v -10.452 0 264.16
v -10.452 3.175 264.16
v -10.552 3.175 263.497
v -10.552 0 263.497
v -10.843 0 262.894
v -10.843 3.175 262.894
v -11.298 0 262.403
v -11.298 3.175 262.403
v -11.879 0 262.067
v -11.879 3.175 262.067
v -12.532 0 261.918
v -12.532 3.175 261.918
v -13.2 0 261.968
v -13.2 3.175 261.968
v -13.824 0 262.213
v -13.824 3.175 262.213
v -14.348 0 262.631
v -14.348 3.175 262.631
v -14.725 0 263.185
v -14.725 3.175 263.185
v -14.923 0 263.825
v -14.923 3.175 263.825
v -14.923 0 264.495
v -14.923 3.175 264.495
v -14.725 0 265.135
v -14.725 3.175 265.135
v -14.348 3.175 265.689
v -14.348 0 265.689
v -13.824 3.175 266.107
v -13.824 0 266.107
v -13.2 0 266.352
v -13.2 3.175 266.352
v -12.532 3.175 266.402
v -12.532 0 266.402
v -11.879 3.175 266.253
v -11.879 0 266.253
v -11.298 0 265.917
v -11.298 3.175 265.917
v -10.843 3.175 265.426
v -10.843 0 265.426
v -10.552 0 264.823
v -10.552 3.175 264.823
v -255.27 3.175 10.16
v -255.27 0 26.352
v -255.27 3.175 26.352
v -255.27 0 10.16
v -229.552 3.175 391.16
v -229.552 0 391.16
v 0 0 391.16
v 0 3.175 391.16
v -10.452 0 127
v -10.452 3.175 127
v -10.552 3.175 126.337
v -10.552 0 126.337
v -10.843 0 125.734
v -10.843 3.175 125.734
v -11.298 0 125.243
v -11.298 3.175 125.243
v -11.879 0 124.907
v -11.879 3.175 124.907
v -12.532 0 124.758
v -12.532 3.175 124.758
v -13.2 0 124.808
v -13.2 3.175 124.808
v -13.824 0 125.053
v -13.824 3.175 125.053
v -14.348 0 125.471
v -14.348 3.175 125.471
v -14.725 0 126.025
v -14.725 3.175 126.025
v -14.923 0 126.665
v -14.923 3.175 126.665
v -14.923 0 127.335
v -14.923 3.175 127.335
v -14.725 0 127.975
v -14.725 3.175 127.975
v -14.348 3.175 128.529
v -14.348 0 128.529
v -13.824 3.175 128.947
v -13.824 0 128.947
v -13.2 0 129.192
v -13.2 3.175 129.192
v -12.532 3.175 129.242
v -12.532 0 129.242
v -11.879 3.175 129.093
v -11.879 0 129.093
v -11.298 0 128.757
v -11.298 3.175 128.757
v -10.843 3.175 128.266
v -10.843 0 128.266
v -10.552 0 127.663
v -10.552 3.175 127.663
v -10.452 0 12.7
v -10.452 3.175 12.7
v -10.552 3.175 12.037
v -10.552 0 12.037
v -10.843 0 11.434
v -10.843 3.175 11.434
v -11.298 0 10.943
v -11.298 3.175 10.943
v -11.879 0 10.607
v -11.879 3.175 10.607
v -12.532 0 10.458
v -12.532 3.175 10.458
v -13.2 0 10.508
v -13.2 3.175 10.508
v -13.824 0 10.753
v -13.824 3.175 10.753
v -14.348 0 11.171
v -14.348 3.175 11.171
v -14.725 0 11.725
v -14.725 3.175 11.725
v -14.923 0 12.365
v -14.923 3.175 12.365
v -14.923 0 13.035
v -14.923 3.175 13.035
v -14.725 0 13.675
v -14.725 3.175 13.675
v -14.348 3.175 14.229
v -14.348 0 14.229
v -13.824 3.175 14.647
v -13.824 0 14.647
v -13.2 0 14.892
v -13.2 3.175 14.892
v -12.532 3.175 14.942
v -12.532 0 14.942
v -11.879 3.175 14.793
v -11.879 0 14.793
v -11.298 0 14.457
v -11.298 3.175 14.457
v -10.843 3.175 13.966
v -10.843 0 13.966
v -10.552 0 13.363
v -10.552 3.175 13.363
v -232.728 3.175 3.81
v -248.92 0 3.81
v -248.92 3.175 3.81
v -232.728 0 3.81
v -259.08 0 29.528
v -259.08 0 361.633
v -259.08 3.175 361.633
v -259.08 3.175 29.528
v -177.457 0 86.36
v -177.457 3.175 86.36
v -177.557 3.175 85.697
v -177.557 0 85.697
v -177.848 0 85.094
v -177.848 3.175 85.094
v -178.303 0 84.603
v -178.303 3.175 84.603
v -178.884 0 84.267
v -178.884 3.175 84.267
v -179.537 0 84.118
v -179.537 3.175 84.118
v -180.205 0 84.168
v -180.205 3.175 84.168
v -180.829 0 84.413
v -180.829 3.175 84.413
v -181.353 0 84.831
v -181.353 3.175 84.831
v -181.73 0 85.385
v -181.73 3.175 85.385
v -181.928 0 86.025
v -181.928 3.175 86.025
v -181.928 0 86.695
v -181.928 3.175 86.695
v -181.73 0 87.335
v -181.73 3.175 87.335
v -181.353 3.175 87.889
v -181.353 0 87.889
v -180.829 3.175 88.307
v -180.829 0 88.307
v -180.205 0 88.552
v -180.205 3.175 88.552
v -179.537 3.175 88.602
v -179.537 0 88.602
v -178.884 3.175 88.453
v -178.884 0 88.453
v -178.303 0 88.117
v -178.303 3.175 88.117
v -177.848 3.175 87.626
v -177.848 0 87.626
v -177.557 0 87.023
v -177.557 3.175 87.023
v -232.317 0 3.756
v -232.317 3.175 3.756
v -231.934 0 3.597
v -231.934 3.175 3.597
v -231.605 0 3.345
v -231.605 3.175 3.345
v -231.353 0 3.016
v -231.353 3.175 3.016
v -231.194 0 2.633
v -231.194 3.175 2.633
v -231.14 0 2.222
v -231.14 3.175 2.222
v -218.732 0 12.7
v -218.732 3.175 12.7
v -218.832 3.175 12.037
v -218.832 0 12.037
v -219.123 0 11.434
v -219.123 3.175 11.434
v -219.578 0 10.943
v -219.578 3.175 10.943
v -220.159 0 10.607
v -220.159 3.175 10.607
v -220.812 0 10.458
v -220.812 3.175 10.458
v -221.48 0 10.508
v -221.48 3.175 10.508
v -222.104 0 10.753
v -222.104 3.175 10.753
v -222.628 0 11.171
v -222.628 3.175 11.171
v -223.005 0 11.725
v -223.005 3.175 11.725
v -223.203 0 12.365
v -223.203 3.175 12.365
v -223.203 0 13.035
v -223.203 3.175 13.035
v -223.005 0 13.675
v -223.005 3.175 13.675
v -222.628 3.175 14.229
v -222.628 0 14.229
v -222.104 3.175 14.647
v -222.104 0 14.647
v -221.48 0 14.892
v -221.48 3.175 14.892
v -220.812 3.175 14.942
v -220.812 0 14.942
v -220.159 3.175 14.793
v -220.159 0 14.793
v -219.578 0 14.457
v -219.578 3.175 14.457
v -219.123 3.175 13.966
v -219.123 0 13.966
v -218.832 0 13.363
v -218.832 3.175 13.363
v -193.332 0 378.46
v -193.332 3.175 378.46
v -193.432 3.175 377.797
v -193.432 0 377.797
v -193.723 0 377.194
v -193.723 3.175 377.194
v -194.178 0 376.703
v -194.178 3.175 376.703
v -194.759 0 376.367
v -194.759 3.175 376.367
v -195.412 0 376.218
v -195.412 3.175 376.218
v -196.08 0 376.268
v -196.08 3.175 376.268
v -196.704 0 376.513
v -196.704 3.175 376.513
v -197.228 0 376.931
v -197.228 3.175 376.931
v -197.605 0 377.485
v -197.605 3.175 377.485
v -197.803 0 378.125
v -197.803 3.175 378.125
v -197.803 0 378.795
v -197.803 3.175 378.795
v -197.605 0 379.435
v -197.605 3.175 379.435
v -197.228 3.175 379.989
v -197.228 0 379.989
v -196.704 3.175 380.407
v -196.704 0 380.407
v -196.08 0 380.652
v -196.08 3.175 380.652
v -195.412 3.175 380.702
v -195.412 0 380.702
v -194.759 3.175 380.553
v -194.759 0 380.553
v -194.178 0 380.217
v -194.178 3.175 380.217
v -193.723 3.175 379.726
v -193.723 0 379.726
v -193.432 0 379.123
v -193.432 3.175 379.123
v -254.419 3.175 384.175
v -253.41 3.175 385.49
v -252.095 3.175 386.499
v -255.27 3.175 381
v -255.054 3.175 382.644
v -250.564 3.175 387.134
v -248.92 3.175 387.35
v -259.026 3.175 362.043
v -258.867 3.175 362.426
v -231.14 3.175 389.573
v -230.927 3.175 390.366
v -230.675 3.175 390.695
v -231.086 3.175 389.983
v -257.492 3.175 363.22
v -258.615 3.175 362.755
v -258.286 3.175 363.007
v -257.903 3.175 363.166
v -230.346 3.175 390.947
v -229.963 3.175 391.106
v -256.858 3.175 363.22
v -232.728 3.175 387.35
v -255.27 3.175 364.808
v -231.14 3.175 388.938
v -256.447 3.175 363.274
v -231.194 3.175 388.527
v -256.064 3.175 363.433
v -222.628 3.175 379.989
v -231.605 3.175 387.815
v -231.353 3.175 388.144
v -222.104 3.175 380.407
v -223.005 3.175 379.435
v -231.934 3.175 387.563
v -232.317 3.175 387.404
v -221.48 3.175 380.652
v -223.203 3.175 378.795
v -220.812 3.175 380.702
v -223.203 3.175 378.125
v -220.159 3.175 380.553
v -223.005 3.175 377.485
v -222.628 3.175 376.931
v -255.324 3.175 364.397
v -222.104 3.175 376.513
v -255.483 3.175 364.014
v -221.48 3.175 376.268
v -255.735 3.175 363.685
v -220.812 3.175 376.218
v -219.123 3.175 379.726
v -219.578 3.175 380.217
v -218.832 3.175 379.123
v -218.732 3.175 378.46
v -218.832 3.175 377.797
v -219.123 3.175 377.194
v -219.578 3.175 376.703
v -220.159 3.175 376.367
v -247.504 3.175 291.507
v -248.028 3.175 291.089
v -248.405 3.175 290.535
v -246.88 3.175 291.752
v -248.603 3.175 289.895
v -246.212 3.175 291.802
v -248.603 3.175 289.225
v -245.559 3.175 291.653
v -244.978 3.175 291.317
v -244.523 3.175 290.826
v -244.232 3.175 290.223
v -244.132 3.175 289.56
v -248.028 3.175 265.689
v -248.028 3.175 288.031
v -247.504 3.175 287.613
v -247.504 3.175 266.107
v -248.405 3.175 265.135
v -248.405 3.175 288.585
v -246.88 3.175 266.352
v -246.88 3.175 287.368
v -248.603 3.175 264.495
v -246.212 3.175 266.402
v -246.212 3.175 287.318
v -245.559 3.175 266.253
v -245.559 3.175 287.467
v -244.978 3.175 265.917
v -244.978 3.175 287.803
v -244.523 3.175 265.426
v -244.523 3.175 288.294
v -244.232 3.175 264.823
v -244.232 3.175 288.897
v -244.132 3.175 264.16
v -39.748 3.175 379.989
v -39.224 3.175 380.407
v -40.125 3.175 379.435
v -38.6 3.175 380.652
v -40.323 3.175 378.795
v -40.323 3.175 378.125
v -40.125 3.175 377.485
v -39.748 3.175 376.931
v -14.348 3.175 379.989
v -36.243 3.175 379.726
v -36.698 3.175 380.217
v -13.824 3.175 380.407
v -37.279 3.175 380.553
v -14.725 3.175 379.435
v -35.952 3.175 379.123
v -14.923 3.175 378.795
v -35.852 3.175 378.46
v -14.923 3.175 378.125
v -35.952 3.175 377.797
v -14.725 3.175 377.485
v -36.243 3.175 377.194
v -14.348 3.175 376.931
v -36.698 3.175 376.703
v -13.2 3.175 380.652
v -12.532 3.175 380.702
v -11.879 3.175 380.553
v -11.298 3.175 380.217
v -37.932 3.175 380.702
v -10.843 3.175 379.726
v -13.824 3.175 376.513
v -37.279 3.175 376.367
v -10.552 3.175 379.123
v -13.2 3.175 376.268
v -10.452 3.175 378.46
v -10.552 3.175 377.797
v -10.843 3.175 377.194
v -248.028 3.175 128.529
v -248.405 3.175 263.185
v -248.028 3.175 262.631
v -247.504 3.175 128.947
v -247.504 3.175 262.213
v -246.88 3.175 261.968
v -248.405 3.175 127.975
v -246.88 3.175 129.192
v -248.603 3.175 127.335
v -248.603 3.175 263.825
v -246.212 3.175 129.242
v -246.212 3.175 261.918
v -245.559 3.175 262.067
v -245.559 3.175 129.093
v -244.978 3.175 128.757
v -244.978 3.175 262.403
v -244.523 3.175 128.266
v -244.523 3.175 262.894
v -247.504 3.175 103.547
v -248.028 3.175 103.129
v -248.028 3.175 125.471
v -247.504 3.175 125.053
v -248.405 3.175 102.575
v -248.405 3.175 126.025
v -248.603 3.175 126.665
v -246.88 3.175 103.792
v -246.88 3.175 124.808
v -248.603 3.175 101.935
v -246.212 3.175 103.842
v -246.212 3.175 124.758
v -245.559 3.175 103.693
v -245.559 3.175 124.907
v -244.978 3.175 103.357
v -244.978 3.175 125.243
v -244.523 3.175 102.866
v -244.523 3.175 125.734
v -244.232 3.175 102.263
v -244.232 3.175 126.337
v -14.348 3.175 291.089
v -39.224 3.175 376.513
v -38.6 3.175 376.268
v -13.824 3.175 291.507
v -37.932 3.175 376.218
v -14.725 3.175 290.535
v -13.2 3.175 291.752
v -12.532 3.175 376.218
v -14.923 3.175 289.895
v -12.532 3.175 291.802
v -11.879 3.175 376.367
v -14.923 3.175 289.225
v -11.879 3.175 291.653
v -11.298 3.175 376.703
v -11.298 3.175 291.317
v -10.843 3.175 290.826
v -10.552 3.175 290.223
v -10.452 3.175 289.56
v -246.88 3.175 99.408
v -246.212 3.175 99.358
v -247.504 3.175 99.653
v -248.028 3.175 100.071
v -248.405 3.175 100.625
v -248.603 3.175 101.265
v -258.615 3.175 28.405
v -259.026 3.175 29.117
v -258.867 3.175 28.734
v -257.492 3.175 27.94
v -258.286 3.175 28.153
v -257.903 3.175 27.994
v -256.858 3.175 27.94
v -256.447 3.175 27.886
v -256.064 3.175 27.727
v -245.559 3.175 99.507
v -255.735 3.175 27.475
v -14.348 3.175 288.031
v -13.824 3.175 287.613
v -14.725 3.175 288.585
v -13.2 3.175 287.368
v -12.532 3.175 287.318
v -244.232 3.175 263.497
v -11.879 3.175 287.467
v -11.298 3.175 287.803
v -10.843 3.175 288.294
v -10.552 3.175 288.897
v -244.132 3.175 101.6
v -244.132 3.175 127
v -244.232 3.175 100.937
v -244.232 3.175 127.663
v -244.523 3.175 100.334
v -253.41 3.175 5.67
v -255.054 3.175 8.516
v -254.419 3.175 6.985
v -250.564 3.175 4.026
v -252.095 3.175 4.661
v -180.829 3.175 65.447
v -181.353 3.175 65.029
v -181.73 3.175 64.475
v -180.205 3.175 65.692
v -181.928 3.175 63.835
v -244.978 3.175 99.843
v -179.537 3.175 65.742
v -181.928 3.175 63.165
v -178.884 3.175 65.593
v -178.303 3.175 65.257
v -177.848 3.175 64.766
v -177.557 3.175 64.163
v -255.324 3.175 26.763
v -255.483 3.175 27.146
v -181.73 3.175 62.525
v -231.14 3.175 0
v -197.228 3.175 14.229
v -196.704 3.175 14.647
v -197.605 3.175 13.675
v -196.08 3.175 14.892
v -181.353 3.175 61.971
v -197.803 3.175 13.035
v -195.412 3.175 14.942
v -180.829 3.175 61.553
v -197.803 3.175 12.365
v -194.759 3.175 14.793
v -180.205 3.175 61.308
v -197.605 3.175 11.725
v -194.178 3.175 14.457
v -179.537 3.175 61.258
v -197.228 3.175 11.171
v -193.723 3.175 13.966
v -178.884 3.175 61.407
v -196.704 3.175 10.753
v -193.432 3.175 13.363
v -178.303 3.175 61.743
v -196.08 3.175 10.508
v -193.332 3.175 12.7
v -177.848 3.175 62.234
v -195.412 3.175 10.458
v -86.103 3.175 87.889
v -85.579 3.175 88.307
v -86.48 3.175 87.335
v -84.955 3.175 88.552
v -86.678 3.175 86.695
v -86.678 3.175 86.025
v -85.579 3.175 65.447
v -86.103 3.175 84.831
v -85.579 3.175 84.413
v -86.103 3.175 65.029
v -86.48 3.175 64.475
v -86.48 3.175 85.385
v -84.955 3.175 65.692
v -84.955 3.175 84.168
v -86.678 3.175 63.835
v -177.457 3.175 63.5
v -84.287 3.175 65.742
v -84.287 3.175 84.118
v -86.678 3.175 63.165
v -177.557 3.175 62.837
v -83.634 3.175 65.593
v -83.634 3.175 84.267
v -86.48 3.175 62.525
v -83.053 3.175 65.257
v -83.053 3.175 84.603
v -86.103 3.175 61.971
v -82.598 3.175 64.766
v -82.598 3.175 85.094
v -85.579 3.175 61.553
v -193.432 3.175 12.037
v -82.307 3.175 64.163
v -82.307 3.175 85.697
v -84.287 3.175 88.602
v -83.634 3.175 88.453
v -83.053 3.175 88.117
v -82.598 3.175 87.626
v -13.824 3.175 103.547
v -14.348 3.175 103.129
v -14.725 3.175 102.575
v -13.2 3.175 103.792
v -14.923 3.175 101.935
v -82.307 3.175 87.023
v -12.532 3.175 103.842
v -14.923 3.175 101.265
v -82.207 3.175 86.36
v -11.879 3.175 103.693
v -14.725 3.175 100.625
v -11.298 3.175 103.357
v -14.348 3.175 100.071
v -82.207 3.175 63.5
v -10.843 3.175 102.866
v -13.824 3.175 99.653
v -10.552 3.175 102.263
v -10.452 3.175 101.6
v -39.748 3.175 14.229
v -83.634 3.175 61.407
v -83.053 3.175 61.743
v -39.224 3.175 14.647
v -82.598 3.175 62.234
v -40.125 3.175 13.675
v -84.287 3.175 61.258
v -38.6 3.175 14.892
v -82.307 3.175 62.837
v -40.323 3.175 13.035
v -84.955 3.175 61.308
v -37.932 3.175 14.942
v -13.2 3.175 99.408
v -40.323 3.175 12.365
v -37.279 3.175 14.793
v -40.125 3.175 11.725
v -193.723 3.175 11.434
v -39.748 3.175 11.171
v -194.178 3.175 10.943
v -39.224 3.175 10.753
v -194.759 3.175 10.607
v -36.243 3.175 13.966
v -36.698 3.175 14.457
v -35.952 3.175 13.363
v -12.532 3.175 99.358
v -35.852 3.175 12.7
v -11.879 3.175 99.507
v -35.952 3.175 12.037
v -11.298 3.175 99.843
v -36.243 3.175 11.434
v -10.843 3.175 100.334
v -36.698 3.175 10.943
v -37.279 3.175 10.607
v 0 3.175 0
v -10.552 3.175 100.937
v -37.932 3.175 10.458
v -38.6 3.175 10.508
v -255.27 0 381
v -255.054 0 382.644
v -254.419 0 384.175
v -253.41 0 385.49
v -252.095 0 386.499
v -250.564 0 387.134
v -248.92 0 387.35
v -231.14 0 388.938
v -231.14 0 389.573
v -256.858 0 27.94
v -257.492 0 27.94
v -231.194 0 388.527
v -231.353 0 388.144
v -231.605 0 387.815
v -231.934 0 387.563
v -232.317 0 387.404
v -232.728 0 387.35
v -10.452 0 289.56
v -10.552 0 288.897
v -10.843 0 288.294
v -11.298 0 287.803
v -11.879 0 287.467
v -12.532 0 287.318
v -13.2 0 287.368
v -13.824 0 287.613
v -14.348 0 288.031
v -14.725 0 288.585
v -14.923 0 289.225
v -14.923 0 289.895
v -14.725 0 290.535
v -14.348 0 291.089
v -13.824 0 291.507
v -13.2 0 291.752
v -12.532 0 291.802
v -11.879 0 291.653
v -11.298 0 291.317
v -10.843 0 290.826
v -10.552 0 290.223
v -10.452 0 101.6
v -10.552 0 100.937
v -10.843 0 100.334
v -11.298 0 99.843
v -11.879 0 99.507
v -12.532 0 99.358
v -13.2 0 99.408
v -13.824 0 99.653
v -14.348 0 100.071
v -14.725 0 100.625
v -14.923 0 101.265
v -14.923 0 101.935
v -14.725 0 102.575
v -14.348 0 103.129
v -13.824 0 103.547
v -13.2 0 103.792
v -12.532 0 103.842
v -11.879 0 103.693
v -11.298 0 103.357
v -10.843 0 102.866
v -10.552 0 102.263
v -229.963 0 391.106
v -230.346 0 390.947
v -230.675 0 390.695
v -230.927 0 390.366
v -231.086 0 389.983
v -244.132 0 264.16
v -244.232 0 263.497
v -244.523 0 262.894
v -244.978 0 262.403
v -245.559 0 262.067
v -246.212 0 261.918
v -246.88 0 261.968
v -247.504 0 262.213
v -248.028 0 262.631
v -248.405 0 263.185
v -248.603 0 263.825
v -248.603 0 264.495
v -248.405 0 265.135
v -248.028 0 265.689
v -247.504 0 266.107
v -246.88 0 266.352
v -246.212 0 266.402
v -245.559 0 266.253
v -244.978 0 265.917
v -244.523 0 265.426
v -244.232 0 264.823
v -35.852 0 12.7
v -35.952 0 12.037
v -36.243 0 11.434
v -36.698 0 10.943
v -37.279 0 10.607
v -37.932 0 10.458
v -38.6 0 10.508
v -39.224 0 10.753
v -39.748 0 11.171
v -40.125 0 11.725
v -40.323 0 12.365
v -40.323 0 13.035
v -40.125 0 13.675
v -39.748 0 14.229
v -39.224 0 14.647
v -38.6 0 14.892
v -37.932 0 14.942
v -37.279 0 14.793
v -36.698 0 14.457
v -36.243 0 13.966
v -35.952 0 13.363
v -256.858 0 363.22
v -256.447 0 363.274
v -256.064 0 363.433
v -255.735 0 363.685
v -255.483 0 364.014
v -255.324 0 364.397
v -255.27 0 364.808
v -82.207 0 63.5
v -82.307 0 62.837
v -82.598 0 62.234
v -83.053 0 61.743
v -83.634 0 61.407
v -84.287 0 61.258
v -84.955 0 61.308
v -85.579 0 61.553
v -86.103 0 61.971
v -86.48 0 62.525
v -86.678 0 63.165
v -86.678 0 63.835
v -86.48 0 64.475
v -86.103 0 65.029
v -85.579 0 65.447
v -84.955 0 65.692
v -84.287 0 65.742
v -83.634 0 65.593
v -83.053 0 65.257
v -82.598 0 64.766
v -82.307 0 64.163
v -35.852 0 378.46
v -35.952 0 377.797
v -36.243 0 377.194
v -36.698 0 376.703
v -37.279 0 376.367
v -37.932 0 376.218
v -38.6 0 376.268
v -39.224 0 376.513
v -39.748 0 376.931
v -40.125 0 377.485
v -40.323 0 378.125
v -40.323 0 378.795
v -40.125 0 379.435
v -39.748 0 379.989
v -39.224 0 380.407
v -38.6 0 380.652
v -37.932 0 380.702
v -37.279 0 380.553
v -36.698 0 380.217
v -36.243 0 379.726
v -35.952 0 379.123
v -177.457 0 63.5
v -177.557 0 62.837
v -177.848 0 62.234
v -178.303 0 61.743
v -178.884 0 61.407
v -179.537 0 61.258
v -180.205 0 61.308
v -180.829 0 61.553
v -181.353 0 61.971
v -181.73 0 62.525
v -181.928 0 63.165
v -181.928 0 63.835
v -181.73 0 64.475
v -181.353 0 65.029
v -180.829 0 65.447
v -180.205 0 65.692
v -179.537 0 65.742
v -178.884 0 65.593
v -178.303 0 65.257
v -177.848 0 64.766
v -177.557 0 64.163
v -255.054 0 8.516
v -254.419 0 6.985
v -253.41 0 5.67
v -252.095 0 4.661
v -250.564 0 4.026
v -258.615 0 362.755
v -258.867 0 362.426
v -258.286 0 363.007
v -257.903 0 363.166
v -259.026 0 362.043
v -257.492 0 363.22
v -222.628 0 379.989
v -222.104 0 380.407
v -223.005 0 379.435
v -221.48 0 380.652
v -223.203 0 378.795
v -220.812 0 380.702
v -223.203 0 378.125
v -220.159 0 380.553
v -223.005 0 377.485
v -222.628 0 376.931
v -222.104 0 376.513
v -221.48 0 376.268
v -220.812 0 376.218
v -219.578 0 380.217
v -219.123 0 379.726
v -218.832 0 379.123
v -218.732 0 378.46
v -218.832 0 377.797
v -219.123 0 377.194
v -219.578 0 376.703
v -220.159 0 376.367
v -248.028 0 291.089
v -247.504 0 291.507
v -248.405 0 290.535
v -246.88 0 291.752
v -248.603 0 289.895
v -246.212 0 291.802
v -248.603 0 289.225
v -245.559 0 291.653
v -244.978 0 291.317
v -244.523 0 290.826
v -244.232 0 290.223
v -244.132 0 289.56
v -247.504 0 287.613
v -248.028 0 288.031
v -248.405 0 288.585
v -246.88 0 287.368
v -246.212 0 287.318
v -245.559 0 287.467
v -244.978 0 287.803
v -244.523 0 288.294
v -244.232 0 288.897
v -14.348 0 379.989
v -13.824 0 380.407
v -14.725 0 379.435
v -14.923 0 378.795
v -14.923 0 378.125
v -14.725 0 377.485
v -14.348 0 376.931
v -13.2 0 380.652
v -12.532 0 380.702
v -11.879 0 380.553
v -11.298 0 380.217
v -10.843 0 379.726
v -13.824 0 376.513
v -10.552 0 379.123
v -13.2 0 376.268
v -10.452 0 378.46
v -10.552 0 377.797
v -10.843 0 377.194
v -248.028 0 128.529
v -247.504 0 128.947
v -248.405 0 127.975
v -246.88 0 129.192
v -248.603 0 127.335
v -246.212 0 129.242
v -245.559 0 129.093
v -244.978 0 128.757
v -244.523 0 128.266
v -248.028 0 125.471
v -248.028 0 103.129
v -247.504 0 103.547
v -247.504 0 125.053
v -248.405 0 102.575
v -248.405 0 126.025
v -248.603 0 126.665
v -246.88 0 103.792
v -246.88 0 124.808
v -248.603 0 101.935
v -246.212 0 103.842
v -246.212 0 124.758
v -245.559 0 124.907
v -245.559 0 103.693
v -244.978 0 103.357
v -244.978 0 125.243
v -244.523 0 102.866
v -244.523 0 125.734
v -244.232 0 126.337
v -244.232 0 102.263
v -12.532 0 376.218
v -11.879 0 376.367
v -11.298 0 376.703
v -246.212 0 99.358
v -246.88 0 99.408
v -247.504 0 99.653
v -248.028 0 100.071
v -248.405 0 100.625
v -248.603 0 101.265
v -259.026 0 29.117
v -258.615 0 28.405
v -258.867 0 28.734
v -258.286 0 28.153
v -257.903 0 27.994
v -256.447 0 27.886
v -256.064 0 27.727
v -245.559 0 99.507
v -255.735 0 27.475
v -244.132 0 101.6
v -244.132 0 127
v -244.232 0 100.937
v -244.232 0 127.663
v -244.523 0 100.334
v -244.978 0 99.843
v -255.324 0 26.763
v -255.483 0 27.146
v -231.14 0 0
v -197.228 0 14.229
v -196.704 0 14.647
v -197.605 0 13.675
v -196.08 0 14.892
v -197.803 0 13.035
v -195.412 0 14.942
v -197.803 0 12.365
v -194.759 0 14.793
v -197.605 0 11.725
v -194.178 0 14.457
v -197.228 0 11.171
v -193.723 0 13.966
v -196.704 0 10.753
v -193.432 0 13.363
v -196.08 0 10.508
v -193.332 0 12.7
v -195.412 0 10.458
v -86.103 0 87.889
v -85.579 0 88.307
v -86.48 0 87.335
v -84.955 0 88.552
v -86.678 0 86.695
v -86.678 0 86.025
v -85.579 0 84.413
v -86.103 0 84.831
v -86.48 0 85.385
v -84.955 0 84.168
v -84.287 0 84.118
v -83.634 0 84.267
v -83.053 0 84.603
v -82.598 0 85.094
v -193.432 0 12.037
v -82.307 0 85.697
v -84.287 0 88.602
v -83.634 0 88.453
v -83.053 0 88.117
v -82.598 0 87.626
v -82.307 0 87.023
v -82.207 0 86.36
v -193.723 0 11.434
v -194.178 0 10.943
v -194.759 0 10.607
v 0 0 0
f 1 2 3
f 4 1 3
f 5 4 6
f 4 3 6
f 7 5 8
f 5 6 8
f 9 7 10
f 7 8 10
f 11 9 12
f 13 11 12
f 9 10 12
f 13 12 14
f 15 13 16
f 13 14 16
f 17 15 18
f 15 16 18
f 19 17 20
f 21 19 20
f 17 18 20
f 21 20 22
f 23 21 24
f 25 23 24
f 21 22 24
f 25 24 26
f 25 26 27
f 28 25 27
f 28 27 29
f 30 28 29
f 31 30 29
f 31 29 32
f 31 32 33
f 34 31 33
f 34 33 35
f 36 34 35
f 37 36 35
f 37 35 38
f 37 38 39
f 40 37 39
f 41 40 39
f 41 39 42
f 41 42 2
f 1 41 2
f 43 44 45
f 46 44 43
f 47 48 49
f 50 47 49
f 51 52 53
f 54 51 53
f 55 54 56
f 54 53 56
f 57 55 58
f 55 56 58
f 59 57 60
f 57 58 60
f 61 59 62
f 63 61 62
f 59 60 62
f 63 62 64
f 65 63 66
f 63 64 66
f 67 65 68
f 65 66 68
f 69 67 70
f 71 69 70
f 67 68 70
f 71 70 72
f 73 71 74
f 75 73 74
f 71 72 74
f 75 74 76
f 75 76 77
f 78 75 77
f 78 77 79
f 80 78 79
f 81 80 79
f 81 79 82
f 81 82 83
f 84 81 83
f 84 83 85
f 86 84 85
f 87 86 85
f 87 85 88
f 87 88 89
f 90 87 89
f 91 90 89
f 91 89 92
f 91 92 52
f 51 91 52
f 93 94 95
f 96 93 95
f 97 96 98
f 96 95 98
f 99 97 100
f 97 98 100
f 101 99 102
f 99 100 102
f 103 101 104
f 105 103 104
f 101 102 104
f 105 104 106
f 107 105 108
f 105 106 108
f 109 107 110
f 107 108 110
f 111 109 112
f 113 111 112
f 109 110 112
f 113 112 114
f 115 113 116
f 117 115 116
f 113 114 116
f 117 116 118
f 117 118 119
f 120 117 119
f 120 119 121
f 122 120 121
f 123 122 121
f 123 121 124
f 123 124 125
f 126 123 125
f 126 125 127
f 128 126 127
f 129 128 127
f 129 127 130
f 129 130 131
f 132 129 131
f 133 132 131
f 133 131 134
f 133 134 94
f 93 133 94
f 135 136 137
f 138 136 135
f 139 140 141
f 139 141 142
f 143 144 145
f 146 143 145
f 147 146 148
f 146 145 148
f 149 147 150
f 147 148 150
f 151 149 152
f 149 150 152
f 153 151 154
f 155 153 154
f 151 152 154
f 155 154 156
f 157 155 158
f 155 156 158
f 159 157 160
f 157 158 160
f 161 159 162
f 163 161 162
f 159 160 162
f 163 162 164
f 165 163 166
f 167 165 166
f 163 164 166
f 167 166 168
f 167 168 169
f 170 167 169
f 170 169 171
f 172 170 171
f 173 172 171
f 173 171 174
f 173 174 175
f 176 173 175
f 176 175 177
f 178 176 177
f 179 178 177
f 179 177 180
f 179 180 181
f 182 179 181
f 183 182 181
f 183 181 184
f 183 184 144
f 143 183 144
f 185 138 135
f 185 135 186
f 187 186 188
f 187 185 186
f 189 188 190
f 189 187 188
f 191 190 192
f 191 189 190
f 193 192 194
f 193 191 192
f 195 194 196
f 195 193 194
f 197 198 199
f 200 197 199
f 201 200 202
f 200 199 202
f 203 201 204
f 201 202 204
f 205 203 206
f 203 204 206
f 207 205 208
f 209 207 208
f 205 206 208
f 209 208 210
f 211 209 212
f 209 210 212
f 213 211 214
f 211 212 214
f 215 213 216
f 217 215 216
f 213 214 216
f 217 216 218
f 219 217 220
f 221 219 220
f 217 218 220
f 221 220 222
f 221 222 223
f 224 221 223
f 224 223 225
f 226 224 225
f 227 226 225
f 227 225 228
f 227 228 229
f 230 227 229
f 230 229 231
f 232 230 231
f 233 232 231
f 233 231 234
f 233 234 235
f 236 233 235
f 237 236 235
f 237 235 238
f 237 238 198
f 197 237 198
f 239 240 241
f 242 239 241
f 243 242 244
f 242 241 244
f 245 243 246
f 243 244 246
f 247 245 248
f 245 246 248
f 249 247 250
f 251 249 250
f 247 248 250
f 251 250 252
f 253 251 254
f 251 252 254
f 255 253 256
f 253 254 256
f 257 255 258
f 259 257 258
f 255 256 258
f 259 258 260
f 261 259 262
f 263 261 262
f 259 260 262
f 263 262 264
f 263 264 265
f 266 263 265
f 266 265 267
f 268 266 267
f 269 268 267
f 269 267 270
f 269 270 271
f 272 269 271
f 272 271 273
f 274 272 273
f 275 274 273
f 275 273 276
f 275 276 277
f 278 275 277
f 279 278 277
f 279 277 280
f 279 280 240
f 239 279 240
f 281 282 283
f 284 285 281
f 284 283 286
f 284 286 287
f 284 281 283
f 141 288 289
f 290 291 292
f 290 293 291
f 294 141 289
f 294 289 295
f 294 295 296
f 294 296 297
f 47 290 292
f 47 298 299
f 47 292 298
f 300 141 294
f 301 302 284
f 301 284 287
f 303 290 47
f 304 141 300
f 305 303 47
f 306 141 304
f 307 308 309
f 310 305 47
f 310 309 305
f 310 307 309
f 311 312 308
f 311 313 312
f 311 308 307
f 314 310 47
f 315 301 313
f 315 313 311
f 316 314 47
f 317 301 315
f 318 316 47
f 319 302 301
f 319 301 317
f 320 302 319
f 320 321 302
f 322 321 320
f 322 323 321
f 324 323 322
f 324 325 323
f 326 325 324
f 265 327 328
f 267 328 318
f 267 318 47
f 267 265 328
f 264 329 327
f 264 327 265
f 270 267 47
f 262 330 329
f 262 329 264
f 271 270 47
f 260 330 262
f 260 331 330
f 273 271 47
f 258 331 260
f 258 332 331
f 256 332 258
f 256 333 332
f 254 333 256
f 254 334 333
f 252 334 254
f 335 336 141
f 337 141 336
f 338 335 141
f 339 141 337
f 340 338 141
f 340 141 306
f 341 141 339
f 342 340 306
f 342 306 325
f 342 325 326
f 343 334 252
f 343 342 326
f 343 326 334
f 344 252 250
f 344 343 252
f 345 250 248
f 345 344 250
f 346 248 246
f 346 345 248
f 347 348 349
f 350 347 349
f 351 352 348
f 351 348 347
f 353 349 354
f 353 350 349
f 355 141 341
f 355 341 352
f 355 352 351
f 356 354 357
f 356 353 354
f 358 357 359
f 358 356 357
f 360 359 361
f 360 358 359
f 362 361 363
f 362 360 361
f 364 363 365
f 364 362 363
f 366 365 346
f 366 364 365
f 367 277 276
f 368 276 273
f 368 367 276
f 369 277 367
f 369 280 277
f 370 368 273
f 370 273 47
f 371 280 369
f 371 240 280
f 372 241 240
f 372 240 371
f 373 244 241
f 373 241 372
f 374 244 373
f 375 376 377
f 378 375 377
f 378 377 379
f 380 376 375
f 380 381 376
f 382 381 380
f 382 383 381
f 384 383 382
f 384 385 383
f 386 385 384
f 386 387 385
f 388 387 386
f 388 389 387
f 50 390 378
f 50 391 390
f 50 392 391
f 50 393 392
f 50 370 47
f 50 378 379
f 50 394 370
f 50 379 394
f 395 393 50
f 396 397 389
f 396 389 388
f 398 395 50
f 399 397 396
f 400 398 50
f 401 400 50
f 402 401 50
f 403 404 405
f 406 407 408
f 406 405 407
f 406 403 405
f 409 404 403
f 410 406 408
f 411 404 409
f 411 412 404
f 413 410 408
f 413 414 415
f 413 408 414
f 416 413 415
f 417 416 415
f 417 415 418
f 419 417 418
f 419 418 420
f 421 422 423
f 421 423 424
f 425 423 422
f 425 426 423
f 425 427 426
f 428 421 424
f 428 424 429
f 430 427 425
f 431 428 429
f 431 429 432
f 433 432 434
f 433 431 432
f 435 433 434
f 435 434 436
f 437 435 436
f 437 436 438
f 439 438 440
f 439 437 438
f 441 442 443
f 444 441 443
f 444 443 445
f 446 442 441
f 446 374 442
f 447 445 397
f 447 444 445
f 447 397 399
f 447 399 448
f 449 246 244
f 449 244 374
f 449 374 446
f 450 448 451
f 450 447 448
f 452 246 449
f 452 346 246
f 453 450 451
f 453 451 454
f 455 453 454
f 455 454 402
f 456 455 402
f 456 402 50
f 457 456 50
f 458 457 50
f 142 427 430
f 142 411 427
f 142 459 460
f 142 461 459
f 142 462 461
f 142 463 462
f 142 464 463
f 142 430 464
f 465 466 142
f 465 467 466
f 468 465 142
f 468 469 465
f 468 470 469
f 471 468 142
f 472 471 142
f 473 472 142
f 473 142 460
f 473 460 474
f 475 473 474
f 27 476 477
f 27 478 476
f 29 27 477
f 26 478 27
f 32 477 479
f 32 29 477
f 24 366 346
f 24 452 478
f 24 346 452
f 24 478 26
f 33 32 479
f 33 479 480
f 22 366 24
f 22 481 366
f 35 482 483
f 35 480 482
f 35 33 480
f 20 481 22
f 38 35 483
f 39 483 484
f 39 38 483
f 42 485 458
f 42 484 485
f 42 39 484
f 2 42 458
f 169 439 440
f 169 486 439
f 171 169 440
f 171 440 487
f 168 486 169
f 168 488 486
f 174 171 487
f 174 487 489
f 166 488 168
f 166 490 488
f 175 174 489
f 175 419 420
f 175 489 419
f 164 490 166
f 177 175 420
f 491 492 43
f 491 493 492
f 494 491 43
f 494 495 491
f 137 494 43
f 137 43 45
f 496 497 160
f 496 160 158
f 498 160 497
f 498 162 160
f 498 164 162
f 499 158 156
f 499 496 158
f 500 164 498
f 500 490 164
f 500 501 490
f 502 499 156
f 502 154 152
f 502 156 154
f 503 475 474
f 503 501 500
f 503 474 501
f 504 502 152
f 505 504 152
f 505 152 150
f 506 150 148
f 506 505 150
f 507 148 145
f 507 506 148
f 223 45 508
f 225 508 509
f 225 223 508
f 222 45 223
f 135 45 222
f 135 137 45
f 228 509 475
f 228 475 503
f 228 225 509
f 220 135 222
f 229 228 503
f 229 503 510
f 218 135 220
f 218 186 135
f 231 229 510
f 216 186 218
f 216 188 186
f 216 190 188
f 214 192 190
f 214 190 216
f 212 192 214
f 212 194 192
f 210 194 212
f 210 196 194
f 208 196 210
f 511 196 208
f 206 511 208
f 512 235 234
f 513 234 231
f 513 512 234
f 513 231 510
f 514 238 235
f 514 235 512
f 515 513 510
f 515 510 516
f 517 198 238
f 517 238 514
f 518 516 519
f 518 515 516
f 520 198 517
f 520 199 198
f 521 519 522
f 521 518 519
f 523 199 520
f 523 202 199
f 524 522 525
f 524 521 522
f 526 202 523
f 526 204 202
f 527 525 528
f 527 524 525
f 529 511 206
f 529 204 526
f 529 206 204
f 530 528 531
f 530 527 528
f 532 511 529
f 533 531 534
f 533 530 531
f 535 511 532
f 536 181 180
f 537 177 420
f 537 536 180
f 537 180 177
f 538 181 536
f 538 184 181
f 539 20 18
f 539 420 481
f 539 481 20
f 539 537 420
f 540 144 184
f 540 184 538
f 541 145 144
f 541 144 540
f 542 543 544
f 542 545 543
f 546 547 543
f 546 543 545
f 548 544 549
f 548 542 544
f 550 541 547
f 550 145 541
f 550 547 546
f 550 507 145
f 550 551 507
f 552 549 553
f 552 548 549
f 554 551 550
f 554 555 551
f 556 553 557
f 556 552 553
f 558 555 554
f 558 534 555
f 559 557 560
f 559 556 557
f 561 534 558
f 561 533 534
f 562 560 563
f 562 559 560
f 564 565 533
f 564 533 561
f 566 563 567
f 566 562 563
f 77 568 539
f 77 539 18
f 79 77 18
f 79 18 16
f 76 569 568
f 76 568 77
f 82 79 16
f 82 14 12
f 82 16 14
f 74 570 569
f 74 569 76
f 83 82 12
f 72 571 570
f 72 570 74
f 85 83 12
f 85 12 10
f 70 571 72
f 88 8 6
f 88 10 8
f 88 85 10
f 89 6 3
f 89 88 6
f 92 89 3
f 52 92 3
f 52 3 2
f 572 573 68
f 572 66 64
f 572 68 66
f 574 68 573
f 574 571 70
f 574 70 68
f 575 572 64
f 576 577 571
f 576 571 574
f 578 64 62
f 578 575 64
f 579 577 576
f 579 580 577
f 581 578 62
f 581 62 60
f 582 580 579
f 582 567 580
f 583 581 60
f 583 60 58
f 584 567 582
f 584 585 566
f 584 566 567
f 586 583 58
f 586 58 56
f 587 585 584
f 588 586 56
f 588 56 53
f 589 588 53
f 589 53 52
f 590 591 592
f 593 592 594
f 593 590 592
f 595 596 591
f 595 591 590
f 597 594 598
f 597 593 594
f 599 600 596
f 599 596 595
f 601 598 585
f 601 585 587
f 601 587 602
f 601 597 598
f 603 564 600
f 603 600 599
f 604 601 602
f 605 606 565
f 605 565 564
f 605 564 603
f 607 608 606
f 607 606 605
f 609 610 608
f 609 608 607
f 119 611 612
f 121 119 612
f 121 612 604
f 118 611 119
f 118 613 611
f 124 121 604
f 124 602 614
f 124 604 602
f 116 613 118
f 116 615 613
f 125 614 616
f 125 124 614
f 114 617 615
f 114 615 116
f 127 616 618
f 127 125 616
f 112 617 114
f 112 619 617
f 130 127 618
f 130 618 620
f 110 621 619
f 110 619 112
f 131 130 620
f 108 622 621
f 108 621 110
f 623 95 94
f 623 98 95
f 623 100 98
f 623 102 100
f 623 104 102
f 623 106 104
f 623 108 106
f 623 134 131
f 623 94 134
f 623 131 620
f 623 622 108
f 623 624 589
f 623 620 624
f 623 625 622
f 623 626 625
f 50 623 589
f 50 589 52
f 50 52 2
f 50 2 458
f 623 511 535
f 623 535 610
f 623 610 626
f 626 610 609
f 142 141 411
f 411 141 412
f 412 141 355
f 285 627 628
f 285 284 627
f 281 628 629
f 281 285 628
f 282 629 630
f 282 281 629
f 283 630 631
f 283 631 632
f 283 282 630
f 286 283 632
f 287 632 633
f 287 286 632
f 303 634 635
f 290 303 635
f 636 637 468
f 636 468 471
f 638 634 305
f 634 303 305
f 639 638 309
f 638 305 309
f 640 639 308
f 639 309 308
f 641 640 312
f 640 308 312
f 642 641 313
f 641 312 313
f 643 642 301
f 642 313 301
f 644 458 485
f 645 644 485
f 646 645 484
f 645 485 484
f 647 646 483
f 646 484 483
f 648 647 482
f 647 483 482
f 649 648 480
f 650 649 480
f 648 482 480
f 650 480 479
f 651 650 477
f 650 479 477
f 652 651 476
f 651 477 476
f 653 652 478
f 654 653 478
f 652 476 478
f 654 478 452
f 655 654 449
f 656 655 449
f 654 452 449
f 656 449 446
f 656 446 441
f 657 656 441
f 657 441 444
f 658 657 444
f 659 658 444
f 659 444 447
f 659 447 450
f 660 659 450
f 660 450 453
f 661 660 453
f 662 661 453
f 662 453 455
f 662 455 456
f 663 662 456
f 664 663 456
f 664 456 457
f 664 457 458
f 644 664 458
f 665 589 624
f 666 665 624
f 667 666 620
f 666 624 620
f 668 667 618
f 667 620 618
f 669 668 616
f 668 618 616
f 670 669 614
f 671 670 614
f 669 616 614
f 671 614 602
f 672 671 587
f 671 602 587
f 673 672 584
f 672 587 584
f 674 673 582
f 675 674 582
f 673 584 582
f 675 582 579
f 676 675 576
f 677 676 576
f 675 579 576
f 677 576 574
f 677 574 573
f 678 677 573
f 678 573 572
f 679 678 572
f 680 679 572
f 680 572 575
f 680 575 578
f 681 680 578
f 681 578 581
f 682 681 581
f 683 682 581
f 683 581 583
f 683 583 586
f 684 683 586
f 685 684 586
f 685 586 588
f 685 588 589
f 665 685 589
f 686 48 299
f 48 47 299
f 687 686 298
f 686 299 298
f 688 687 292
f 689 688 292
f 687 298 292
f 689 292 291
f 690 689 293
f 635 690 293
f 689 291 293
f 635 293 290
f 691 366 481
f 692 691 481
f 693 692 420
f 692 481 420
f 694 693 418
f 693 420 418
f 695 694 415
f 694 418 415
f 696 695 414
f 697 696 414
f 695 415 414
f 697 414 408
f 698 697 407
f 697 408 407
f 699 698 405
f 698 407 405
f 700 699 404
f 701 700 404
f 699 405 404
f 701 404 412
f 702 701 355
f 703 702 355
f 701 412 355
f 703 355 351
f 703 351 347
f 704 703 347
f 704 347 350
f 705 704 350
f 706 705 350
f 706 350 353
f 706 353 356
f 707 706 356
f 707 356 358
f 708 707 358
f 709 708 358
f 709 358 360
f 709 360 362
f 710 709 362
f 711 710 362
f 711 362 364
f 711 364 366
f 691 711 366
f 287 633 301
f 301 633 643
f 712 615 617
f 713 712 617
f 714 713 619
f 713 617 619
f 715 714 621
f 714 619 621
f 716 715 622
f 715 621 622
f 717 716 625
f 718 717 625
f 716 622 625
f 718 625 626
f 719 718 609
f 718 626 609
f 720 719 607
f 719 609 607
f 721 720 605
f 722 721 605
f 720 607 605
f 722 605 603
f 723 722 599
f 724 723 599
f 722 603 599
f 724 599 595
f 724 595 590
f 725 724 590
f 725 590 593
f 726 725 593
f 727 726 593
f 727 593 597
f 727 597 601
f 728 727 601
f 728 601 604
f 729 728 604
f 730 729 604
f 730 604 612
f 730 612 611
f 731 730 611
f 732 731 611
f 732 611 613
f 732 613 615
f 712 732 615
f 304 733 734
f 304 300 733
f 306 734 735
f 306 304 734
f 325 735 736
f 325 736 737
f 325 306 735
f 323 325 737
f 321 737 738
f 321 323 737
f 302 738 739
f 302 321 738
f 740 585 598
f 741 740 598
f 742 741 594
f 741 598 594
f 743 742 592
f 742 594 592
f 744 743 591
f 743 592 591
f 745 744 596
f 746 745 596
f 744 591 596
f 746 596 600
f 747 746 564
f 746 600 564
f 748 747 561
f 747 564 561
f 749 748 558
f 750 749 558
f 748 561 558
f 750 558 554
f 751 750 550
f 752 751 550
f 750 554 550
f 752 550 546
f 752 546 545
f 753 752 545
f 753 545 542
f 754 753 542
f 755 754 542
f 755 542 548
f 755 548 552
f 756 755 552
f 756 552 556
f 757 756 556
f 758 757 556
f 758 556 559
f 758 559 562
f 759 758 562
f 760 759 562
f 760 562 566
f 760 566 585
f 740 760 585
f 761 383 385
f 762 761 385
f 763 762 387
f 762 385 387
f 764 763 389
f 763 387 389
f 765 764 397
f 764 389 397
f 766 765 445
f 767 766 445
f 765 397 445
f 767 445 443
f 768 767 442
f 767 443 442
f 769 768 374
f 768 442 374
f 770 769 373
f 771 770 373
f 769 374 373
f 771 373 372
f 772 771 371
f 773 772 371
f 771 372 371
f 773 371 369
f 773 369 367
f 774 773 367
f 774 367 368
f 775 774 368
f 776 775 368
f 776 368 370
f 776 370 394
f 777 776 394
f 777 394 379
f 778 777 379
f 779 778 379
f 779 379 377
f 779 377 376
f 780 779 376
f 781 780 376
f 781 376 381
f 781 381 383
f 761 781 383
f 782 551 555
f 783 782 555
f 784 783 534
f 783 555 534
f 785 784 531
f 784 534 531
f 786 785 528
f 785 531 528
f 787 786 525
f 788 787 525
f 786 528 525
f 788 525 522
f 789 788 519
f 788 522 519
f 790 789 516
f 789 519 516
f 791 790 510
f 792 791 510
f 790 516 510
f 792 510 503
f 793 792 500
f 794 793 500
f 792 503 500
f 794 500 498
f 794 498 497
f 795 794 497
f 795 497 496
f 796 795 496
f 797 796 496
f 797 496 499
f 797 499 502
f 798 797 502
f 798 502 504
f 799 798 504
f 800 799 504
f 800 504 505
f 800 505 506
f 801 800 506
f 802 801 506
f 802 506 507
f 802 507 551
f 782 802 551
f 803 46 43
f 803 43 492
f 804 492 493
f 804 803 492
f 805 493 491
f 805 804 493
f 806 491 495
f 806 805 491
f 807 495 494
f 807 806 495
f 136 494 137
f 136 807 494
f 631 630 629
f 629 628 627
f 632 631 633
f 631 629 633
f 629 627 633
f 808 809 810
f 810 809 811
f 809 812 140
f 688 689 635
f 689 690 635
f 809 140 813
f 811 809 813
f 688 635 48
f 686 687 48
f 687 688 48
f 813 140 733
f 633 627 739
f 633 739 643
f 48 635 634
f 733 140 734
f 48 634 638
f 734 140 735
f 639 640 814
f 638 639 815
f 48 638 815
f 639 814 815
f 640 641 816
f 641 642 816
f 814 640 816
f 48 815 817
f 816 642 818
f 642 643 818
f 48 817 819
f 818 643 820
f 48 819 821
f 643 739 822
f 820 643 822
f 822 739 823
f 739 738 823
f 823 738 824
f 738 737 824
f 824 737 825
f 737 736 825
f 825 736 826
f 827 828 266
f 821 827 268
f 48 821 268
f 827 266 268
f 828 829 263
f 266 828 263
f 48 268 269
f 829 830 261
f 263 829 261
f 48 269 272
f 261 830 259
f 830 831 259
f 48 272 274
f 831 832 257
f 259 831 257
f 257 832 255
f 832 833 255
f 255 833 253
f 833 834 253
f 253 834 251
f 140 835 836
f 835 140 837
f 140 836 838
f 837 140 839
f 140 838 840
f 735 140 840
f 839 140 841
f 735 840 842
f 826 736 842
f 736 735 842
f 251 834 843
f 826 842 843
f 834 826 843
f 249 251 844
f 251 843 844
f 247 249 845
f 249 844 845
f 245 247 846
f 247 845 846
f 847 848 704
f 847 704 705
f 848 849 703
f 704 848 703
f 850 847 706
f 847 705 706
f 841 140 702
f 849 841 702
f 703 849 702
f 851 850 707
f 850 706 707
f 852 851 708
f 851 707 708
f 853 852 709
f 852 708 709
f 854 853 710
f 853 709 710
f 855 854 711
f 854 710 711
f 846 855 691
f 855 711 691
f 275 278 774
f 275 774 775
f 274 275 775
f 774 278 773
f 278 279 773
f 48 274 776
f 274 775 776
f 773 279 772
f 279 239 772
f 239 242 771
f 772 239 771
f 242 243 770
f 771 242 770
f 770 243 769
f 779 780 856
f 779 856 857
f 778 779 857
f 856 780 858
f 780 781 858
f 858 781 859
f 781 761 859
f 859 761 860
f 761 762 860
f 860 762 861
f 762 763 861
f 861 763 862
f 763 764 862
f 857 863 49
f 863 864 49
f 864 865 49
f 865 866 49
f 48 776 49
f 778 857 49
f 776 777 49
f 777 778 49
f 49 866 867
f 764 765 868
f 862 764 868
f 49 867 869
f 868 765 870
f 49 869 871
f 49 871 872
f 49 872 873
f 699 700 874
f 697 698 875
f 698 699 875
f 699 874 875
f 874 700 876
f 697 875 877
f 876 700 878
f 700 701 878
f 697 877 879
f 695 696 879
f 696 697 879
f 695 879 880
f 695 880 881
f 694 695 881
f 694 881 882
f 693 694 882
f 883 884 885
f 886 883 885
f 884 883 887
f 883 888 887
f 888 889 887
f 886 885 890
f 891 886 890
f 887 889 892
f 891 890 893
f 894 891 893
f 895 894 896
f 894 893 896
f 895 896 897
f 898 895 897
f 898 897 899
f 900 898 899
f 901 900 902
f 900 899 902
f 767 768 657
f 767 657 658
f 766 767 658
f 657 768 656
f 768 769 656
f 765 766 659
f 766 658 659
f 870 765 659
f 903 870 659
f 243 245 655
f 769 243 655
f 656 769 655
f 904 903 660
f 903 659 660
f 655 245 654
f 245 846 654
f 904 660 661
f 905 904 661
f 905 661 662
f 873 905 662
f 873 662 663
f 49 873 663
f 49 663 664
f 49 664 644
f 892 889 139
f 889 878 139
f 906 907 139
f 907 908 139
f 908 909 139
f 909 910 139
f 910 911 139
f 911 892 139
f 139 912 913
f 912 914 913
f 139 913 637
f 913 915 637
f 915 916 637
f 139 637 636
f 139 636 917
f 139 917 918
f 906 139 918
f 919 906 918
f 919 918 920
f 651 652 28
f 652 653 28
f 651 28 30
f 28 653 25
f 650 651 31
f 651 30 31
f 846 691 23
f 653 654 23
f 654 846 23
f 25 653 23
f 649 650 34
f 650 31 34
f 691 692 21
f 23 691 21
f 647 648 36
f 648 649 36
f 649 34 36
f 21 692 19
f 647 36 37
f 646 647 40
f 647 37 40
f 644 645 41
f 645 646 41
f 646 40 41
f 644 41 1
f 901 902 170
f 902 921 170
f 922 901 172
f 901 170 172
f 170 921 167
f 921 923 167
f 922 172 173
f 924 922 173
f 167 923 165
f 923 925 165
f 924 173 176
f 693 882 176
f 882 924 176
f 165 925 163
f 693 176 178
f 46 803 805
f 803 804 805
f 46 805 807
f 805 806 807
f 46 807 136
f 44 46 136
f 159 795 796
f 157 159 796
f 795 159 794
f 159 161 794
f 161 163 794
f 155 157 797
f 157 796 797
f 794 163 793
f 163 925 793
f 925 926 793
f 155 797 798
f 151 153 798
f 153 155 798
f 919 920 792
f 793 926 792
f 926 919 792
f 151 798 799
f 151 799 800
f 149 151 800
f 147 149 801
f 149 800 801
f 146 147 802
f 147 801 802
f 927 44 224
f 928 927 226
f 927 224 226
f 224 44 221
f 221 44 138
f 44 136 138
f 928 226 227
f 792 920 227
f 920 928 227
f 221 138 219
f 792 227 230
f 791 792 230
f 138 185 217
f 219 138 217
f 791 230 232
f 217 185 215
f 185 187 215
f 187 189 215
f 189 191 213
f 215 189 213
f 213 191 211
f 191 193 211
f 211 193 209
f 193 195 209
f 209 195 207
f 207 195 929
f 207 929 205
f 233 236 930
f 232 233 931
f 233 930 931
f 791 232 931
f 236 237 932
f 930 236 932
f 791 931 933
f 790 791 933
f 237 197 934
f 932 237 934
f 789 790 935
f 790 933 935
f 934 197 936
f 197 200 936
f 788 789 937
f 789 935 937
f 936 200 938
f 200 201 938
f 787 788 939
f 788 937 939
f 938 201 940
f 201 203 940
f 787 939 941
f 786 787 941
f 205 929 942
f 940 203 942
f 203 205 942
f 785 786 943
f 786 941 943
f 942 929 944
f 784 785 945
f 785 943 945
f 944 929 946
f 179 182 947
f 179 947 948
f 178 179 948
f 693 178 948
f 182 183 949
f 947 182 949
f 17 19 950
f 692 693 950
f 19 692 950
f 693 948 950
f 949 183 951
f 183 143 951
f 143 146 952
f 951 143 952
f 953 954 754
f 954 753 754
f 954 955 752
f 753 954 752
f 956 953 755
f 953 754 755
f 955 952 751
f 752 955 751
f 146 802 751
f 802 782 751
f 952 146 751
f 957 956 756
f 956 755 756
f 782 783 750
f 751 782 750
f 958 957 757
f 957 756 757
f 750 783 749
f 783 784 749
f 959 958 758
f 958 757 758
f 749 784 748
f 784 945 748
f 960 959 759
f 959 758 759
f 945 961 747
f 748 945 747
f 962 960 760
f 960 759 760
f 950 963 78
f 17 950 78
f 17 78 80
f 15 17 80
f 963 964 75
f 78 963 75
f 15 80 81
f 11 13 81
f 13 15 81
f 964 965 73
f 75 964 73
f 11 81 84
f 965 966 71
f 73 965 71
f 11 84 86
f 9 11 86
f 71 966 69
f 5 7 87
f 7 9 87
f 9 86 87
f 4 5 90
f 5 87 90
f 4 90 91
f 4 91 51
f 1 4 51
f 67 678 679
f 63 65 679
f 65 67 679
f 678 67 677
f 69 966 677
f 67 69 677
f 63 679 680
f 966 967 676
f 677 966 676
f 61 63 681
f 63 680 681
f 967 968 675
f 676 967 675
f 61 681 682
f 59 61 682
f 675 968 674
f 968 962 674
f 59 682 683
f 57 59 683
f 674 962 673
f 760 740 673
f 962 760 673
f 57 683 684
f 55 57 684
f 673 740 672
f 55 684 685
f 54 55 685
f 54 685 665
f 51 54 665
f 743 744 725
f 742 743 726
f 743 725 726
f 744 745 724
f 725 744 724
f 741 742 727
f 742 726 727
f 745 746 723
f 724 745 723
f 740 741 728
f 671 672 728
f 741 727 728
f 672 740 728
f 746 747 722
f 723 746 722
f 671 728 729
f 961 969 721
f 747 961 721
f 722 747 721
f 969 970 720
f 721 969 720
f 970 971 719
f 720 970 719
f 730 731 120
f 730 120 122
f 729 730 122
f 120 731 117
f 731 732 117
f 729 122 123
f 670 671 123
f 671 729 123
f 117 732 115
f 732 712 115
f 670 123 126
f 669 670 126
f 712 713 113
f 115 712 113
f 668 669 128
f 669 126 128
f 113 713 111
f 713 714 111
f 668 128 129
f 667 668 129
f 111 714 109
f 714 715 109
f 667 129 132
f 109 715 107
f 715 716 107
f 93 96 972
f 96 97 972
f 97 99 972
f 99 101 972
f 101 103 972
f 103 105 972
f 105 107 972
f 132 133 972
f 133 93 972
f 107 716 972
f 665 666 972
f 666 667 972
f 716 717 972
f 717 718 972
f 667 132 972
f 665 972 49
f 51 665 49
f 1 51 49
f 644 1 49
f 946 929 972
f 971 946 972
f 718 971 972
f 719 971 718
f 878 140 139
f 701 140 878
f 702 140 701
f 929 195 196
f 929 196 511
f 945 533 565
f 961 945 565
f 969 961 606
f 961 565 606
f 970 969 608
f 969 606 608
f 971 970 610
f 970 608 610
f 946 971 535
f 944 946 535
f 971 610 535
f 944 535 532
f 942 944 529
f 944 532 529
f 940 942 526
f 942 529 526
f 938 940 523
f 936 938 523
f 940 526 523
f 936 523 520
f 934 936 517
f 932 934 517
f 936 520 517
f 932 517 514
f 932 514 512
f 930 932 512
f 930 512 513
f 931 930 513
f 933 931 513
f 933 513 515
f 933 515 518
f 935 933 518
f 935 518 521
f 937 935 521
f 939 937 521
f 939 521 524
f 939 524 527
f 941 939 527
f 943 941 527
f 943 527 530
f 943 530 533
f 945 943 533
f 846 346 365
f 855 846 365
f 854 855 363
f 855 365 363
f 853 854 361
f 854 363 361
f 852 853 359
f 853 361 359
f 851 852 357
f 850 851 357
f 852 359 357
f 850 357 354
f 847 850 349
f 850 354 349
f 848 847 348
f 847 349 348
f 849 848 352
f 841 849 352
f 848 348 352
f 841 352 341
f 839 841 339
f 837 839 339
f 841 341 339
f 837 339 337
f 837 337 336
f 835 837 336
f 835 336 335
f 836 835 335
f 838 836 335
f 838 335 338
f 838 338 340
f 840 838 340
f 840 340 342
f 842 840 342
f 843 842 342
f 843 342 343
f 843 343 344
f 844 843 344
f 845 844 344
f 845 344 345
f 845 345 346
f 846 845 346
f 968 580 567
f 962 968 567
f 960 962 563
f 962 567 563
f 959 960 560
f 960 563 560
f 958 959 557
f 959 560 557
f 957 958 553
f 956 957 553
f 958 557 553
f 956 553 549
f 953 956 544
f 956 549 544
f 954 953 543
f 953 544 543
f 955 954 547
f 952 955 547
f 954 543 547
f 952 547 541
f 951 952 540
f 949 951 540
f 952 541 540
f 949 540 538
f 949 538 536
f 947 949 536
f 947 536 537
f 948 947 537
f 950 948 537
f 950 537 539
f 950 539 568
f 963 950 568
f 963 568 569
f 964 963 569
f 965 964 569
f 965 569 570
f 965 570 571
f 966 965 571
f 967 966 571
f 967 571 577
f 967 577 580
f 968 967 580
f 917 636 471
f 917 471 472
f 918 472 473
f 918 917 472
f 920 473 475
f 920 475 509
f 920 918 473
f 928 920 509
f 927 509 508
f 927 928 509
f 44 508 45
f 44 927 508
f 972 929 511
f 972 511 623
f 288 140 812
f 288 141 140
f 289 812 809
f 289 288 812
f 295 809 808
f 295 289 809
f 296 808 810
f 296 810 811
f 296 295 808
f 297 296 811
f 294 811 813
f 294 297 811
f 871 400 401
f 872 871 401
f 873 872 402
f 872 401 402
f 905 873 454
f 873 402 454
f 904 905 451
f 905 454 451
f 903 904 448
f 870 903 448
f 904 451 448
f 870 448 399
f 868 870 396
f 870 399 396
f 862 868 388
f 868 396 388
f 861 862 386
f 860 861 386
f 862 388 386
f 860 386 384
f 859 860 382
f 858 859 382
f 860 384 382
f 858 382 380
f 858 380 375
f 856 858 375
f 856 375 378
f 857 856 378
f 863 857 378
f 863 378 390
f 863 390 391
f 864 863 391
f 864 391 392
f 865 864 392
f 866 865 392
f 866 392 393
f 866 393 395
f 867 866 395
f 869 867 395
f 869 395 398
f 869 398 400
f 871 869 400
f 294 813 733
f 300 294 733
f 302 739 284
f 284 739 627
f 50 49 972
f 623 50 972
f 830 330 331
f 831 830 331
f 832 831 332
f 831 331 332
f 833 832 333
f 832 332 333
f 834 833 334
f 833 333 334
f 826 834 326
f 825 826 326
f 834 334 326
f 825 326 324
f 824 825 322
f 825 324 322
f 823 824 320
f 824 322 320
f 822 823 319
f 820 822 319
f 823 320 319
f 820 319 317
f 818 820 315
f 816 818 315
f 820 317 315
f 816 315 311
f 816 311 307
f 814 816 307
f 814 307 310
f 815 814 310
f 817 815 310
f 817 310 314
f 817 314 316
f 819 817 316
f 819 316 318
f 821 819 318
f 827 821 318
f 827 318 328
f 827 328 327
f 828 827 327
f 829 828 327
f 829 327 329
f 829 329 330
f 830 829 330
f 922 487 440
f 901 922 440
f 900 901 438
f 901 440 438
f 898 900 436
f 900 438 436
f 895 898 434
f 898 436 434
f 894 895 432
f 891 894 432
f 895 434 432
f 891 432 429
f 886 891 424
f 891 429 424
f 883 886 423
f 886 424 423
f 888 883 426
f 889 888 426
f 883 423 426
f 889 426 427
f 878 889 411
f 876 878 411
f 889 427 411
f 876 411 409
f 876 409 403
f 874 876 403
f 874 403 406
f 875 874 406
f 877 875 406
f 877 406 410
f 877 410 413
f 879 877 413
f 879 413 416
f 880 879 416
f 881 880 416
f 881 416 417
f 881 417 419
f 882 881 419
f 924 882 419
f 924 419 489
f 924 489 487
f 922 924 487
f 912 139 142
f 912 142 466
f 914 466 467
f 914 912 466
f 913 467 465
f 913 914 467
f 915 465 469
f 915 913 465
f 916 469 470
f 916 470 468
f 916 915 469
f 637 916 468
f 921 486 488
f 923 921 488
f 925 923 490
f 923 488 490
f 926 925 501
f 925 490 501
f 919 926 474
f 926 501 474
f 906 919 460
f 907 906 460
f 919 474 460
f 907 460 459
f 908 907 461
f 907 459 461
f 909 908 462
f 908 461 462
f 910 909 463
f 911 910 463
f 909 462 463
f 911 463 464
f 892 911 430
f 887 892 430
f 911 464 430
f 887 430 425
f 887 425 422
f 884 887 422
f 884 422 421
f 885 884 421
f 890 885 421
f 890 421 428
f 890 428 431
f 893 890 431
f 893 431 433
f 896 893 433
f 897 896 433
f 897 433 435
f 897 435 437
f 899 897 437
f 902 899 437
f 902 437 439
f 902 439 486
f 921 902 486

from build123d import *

# Parameters (mm, degrees)
SKETCH1_W             = 259.08
SKETCH1_H             = 391.16
BOSS_EXTRUDE1_DEPTH   = 3.175
F_8_CLEARANCE_HOLE1_D = 4.4958
F_8_CLEARANCE_HOLE2_D = 4.4958
SKETCH25_W            = 3.81
SKETCH25_H            = 24.13
SKETCH25_H_2          = 3.81
SKETCH25_W_2          = 24.13
CUT_EXTRUDE1_DEPTH    = 470.18937821
FILLET2_R             = 1.5875
FILLET3_R             = 6.35
MIRROR1_DEPTH         = 3.175


# Read off the part's stored shape, not the designer's step: Mirror1
with BuildPart() as part:
    # Sketch1 → Boss-Extrude1 (new body)
    with BuildSketch(Plane(origin=(0, 0, 0), x_dir=(1, 0, 0), z_dir=(0, 1, 0))):
        with Locations((-129.54, -195.58)):
            Rectangle(SKETCH1_W, SKETCH1_H)
    extrude(amount=BOSS_EXTRUDE1_DEPTH)

    # #8 Clearance Hole1 (through all)
    with Locations(Plane(origin=(0, 0, 0), x_dir=(-1, 0, 0), z_dir=(0, -1, 0))):
        with Locations((84.455, -63.5), (84.455, -86.36), (179.705, -86.36), (179.705, -63.5)):
            Hole(F_8_CLEARANCE_HOLE1_D / 2)

    # #8 Clearance Hole2 (through all)
    with Locations(Plane(origin=(0, 0, 0), x_dir=(-1, 0, 0), z_dir=(0, -1, 0))):
        with Locations((12.7, -101.6), (220.98, -12.7), (246.38, -101.6), (246.38, -289.56), (195.58, -12.7), (12.7, -289.56), (246.38, -264.16), (246.38, -127), (12.7, -127), (12.7, -264.16), (12.7, -378.46), (220.98, -378.46), (38.1, -12.7), (12.7, -12.7), (38.1, -378.46), (195.58, -378.46)):
            Hole(F_8_CLEARANCE_HOLE2_D / 2)

    # Sketch25 → Cut-Extrude1 (cut, through all)
    with BuildSketch(Plane.XZ):
        with Locations((-257.175, 375.285)):
            Rectangle(SKETCH25_W, SKETCH25_H)
        with Locations((-257.175, 389.255)):
            Rectangle(SKETCH25_W, SKETCH25_H_2)
        with Locations((-243.205, 389.255)):
            Rectangle(SKETCH25_W_2, SKETCH25_H_2)
    extrude(amount=-CUT_EXTRUDE1_DEPTH, mode=Mode.SUBTRACT)

    # Fillet2
    fillet2_edges = [part.edges().sort_by_distance(p)[0] for p in [
        (-255.27, 1.5875, 363.22),
        (-259.08, 1.5875, 363.22),
        (-231.14, 1.5875, 391.16),
        (-231.14, 1.5875, 387.35),
    ]]
    fillet(fillet2_edges, radius=FILLET2_R)

    # Fillet3
    fillet3_edges = [part.edges().sort_by_distance(p)[0] for p in [
        (-255.27, 1.5875, 387.35),
    ]]
    fillet(fillet3_edges, radius=FILLET3_R)

    # Mirror1 outline → Mirror1 (cut)
    with BuildSketch(Plane(origin=(0, 0, 0), x_dir=(1, 0, 0), z_dir=(0, 1, 0))):
        with BuildLine():
            ThreePointArc((-256.8575, -27.94), (-255.734967985, -27.475032015), (-255.27, -26.3525))
            Line((-255.27, -26.3525), (-255.27, -10.16))
            ThreePointArc((-255.27, -10.16), (-253.410128061, -5.669871939), (-248.92, -3.81))
            Line((-248.92, -3.81), (-232.7275, -3.81))
            ThreePointArc((-232.7275, -3.81), (-231.604967985, -3.345032015), (-231.14, -2.2225))
            Line((-231.14, -2.2225), (-231.14, 0))
            Line((-231.14, 0), (-259.08, 0))
            Line((-259.08, 0), (-259.08, -29.5275))
            ThreePointArc((-259.08, -29.5275), (-258.615032015, -28.404967985), (-257.4925, -27.94))
            Line((-257.4925, -27.94), (-256.8575, -27.94))
        make_face()
    extrude(amount=MIRROR1_DEPTH, mode=Mode.SUBTRACT)


solid = part.part
